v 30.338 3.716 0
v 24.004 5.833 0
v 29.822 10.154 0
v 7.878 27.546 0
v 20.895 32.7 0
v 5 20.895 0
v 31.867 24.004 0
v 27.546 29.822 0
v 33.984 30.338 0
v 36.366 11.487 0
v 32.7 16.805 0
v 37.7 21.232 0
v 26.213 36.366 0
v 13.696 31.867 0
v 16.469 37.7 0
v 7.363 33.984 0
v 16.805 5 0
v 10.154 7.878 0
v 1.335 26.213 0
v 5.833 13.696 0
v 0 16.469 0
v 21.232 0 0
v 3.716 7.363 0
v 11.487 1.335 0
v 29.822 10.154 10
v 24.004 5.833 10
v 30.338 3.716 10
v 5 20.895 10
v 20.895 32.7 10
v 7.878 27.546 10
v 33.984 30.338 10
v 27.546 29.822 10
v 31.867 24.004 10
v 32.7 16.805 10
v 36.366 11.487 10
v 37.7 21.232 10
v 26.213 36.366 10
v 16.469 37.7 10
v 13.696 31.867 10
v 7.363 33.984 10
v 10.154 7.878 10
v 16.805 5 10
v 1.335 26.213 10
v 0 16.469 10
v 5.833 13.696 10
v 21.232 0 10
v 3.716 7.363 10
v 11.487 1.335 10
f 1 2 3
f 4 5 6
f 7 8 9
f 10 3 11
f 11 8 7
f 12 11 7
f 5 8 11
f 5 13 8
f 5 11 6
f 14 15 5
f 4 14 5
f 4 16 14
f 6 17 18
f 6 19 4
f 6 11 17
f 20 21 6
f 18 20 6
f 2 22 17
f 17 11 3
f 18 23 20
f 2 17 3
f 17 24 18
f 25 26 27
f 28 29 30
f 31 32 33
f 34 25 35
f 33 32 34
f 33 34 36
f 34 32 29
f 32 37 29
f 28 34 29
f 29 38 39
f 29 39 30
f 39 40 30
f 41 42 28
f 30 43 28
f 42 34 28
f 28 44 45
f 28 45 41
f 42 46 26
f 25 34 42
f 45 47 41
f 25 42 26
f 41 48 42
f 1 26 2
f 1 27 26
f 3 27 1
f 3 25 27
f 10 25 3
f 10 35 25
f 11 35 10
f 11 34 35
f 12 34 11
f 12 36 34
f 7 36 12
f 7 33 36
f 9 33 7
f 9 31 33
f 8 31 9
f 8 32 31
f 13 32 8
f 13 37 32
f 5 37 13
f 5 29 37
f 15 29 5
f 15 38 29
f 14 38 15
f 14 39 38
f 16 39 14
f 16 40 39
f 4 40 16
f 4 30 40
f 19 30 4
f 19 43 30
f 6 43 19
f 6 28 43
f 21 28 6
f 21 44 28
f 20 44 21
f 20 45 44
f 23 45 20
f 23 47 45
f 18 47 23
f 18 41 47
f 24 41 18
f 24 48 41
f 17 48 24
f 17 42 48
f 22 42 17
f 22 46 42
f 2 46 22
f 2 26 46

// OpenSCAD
$fn = 32;

// ----------------------------------------------------------------------
// Chain sprocket: 12 teeth, 14 mm root radius
// ----------------------------------------------------------------------

// --- parameters (mm) ---
profile_height = 10;      // extrusion height
profile_points = 24;      // points of the closed outline

profile = [[32.7, 16.805], [37.7, 21.232], [31.867, 24.004], [33.984, 30.338], [27.546, 29.822], [26.213, 36.366], [20.895, 32.7], [16.469, 37.7], [13.696, 31.867], [7.363, 33.984], [7.878, 27.546], [1.335, 26.213], [5, 20.895], [0, 16.469], [5.833, 13.696], [3.716, 7.363], [10.154, 7.878], [11.487, 1.335], [16.805, 5], [21.232, 0], [24.004, 5.833], [30.338, 3.716], [29.822, 10.154], [36.366, 11.487]];  // single closed polygon, 24 points, counter clockwise

// --- the one profile operation ---
linear_extrude(height = profile_height) polygon(points = profile);
